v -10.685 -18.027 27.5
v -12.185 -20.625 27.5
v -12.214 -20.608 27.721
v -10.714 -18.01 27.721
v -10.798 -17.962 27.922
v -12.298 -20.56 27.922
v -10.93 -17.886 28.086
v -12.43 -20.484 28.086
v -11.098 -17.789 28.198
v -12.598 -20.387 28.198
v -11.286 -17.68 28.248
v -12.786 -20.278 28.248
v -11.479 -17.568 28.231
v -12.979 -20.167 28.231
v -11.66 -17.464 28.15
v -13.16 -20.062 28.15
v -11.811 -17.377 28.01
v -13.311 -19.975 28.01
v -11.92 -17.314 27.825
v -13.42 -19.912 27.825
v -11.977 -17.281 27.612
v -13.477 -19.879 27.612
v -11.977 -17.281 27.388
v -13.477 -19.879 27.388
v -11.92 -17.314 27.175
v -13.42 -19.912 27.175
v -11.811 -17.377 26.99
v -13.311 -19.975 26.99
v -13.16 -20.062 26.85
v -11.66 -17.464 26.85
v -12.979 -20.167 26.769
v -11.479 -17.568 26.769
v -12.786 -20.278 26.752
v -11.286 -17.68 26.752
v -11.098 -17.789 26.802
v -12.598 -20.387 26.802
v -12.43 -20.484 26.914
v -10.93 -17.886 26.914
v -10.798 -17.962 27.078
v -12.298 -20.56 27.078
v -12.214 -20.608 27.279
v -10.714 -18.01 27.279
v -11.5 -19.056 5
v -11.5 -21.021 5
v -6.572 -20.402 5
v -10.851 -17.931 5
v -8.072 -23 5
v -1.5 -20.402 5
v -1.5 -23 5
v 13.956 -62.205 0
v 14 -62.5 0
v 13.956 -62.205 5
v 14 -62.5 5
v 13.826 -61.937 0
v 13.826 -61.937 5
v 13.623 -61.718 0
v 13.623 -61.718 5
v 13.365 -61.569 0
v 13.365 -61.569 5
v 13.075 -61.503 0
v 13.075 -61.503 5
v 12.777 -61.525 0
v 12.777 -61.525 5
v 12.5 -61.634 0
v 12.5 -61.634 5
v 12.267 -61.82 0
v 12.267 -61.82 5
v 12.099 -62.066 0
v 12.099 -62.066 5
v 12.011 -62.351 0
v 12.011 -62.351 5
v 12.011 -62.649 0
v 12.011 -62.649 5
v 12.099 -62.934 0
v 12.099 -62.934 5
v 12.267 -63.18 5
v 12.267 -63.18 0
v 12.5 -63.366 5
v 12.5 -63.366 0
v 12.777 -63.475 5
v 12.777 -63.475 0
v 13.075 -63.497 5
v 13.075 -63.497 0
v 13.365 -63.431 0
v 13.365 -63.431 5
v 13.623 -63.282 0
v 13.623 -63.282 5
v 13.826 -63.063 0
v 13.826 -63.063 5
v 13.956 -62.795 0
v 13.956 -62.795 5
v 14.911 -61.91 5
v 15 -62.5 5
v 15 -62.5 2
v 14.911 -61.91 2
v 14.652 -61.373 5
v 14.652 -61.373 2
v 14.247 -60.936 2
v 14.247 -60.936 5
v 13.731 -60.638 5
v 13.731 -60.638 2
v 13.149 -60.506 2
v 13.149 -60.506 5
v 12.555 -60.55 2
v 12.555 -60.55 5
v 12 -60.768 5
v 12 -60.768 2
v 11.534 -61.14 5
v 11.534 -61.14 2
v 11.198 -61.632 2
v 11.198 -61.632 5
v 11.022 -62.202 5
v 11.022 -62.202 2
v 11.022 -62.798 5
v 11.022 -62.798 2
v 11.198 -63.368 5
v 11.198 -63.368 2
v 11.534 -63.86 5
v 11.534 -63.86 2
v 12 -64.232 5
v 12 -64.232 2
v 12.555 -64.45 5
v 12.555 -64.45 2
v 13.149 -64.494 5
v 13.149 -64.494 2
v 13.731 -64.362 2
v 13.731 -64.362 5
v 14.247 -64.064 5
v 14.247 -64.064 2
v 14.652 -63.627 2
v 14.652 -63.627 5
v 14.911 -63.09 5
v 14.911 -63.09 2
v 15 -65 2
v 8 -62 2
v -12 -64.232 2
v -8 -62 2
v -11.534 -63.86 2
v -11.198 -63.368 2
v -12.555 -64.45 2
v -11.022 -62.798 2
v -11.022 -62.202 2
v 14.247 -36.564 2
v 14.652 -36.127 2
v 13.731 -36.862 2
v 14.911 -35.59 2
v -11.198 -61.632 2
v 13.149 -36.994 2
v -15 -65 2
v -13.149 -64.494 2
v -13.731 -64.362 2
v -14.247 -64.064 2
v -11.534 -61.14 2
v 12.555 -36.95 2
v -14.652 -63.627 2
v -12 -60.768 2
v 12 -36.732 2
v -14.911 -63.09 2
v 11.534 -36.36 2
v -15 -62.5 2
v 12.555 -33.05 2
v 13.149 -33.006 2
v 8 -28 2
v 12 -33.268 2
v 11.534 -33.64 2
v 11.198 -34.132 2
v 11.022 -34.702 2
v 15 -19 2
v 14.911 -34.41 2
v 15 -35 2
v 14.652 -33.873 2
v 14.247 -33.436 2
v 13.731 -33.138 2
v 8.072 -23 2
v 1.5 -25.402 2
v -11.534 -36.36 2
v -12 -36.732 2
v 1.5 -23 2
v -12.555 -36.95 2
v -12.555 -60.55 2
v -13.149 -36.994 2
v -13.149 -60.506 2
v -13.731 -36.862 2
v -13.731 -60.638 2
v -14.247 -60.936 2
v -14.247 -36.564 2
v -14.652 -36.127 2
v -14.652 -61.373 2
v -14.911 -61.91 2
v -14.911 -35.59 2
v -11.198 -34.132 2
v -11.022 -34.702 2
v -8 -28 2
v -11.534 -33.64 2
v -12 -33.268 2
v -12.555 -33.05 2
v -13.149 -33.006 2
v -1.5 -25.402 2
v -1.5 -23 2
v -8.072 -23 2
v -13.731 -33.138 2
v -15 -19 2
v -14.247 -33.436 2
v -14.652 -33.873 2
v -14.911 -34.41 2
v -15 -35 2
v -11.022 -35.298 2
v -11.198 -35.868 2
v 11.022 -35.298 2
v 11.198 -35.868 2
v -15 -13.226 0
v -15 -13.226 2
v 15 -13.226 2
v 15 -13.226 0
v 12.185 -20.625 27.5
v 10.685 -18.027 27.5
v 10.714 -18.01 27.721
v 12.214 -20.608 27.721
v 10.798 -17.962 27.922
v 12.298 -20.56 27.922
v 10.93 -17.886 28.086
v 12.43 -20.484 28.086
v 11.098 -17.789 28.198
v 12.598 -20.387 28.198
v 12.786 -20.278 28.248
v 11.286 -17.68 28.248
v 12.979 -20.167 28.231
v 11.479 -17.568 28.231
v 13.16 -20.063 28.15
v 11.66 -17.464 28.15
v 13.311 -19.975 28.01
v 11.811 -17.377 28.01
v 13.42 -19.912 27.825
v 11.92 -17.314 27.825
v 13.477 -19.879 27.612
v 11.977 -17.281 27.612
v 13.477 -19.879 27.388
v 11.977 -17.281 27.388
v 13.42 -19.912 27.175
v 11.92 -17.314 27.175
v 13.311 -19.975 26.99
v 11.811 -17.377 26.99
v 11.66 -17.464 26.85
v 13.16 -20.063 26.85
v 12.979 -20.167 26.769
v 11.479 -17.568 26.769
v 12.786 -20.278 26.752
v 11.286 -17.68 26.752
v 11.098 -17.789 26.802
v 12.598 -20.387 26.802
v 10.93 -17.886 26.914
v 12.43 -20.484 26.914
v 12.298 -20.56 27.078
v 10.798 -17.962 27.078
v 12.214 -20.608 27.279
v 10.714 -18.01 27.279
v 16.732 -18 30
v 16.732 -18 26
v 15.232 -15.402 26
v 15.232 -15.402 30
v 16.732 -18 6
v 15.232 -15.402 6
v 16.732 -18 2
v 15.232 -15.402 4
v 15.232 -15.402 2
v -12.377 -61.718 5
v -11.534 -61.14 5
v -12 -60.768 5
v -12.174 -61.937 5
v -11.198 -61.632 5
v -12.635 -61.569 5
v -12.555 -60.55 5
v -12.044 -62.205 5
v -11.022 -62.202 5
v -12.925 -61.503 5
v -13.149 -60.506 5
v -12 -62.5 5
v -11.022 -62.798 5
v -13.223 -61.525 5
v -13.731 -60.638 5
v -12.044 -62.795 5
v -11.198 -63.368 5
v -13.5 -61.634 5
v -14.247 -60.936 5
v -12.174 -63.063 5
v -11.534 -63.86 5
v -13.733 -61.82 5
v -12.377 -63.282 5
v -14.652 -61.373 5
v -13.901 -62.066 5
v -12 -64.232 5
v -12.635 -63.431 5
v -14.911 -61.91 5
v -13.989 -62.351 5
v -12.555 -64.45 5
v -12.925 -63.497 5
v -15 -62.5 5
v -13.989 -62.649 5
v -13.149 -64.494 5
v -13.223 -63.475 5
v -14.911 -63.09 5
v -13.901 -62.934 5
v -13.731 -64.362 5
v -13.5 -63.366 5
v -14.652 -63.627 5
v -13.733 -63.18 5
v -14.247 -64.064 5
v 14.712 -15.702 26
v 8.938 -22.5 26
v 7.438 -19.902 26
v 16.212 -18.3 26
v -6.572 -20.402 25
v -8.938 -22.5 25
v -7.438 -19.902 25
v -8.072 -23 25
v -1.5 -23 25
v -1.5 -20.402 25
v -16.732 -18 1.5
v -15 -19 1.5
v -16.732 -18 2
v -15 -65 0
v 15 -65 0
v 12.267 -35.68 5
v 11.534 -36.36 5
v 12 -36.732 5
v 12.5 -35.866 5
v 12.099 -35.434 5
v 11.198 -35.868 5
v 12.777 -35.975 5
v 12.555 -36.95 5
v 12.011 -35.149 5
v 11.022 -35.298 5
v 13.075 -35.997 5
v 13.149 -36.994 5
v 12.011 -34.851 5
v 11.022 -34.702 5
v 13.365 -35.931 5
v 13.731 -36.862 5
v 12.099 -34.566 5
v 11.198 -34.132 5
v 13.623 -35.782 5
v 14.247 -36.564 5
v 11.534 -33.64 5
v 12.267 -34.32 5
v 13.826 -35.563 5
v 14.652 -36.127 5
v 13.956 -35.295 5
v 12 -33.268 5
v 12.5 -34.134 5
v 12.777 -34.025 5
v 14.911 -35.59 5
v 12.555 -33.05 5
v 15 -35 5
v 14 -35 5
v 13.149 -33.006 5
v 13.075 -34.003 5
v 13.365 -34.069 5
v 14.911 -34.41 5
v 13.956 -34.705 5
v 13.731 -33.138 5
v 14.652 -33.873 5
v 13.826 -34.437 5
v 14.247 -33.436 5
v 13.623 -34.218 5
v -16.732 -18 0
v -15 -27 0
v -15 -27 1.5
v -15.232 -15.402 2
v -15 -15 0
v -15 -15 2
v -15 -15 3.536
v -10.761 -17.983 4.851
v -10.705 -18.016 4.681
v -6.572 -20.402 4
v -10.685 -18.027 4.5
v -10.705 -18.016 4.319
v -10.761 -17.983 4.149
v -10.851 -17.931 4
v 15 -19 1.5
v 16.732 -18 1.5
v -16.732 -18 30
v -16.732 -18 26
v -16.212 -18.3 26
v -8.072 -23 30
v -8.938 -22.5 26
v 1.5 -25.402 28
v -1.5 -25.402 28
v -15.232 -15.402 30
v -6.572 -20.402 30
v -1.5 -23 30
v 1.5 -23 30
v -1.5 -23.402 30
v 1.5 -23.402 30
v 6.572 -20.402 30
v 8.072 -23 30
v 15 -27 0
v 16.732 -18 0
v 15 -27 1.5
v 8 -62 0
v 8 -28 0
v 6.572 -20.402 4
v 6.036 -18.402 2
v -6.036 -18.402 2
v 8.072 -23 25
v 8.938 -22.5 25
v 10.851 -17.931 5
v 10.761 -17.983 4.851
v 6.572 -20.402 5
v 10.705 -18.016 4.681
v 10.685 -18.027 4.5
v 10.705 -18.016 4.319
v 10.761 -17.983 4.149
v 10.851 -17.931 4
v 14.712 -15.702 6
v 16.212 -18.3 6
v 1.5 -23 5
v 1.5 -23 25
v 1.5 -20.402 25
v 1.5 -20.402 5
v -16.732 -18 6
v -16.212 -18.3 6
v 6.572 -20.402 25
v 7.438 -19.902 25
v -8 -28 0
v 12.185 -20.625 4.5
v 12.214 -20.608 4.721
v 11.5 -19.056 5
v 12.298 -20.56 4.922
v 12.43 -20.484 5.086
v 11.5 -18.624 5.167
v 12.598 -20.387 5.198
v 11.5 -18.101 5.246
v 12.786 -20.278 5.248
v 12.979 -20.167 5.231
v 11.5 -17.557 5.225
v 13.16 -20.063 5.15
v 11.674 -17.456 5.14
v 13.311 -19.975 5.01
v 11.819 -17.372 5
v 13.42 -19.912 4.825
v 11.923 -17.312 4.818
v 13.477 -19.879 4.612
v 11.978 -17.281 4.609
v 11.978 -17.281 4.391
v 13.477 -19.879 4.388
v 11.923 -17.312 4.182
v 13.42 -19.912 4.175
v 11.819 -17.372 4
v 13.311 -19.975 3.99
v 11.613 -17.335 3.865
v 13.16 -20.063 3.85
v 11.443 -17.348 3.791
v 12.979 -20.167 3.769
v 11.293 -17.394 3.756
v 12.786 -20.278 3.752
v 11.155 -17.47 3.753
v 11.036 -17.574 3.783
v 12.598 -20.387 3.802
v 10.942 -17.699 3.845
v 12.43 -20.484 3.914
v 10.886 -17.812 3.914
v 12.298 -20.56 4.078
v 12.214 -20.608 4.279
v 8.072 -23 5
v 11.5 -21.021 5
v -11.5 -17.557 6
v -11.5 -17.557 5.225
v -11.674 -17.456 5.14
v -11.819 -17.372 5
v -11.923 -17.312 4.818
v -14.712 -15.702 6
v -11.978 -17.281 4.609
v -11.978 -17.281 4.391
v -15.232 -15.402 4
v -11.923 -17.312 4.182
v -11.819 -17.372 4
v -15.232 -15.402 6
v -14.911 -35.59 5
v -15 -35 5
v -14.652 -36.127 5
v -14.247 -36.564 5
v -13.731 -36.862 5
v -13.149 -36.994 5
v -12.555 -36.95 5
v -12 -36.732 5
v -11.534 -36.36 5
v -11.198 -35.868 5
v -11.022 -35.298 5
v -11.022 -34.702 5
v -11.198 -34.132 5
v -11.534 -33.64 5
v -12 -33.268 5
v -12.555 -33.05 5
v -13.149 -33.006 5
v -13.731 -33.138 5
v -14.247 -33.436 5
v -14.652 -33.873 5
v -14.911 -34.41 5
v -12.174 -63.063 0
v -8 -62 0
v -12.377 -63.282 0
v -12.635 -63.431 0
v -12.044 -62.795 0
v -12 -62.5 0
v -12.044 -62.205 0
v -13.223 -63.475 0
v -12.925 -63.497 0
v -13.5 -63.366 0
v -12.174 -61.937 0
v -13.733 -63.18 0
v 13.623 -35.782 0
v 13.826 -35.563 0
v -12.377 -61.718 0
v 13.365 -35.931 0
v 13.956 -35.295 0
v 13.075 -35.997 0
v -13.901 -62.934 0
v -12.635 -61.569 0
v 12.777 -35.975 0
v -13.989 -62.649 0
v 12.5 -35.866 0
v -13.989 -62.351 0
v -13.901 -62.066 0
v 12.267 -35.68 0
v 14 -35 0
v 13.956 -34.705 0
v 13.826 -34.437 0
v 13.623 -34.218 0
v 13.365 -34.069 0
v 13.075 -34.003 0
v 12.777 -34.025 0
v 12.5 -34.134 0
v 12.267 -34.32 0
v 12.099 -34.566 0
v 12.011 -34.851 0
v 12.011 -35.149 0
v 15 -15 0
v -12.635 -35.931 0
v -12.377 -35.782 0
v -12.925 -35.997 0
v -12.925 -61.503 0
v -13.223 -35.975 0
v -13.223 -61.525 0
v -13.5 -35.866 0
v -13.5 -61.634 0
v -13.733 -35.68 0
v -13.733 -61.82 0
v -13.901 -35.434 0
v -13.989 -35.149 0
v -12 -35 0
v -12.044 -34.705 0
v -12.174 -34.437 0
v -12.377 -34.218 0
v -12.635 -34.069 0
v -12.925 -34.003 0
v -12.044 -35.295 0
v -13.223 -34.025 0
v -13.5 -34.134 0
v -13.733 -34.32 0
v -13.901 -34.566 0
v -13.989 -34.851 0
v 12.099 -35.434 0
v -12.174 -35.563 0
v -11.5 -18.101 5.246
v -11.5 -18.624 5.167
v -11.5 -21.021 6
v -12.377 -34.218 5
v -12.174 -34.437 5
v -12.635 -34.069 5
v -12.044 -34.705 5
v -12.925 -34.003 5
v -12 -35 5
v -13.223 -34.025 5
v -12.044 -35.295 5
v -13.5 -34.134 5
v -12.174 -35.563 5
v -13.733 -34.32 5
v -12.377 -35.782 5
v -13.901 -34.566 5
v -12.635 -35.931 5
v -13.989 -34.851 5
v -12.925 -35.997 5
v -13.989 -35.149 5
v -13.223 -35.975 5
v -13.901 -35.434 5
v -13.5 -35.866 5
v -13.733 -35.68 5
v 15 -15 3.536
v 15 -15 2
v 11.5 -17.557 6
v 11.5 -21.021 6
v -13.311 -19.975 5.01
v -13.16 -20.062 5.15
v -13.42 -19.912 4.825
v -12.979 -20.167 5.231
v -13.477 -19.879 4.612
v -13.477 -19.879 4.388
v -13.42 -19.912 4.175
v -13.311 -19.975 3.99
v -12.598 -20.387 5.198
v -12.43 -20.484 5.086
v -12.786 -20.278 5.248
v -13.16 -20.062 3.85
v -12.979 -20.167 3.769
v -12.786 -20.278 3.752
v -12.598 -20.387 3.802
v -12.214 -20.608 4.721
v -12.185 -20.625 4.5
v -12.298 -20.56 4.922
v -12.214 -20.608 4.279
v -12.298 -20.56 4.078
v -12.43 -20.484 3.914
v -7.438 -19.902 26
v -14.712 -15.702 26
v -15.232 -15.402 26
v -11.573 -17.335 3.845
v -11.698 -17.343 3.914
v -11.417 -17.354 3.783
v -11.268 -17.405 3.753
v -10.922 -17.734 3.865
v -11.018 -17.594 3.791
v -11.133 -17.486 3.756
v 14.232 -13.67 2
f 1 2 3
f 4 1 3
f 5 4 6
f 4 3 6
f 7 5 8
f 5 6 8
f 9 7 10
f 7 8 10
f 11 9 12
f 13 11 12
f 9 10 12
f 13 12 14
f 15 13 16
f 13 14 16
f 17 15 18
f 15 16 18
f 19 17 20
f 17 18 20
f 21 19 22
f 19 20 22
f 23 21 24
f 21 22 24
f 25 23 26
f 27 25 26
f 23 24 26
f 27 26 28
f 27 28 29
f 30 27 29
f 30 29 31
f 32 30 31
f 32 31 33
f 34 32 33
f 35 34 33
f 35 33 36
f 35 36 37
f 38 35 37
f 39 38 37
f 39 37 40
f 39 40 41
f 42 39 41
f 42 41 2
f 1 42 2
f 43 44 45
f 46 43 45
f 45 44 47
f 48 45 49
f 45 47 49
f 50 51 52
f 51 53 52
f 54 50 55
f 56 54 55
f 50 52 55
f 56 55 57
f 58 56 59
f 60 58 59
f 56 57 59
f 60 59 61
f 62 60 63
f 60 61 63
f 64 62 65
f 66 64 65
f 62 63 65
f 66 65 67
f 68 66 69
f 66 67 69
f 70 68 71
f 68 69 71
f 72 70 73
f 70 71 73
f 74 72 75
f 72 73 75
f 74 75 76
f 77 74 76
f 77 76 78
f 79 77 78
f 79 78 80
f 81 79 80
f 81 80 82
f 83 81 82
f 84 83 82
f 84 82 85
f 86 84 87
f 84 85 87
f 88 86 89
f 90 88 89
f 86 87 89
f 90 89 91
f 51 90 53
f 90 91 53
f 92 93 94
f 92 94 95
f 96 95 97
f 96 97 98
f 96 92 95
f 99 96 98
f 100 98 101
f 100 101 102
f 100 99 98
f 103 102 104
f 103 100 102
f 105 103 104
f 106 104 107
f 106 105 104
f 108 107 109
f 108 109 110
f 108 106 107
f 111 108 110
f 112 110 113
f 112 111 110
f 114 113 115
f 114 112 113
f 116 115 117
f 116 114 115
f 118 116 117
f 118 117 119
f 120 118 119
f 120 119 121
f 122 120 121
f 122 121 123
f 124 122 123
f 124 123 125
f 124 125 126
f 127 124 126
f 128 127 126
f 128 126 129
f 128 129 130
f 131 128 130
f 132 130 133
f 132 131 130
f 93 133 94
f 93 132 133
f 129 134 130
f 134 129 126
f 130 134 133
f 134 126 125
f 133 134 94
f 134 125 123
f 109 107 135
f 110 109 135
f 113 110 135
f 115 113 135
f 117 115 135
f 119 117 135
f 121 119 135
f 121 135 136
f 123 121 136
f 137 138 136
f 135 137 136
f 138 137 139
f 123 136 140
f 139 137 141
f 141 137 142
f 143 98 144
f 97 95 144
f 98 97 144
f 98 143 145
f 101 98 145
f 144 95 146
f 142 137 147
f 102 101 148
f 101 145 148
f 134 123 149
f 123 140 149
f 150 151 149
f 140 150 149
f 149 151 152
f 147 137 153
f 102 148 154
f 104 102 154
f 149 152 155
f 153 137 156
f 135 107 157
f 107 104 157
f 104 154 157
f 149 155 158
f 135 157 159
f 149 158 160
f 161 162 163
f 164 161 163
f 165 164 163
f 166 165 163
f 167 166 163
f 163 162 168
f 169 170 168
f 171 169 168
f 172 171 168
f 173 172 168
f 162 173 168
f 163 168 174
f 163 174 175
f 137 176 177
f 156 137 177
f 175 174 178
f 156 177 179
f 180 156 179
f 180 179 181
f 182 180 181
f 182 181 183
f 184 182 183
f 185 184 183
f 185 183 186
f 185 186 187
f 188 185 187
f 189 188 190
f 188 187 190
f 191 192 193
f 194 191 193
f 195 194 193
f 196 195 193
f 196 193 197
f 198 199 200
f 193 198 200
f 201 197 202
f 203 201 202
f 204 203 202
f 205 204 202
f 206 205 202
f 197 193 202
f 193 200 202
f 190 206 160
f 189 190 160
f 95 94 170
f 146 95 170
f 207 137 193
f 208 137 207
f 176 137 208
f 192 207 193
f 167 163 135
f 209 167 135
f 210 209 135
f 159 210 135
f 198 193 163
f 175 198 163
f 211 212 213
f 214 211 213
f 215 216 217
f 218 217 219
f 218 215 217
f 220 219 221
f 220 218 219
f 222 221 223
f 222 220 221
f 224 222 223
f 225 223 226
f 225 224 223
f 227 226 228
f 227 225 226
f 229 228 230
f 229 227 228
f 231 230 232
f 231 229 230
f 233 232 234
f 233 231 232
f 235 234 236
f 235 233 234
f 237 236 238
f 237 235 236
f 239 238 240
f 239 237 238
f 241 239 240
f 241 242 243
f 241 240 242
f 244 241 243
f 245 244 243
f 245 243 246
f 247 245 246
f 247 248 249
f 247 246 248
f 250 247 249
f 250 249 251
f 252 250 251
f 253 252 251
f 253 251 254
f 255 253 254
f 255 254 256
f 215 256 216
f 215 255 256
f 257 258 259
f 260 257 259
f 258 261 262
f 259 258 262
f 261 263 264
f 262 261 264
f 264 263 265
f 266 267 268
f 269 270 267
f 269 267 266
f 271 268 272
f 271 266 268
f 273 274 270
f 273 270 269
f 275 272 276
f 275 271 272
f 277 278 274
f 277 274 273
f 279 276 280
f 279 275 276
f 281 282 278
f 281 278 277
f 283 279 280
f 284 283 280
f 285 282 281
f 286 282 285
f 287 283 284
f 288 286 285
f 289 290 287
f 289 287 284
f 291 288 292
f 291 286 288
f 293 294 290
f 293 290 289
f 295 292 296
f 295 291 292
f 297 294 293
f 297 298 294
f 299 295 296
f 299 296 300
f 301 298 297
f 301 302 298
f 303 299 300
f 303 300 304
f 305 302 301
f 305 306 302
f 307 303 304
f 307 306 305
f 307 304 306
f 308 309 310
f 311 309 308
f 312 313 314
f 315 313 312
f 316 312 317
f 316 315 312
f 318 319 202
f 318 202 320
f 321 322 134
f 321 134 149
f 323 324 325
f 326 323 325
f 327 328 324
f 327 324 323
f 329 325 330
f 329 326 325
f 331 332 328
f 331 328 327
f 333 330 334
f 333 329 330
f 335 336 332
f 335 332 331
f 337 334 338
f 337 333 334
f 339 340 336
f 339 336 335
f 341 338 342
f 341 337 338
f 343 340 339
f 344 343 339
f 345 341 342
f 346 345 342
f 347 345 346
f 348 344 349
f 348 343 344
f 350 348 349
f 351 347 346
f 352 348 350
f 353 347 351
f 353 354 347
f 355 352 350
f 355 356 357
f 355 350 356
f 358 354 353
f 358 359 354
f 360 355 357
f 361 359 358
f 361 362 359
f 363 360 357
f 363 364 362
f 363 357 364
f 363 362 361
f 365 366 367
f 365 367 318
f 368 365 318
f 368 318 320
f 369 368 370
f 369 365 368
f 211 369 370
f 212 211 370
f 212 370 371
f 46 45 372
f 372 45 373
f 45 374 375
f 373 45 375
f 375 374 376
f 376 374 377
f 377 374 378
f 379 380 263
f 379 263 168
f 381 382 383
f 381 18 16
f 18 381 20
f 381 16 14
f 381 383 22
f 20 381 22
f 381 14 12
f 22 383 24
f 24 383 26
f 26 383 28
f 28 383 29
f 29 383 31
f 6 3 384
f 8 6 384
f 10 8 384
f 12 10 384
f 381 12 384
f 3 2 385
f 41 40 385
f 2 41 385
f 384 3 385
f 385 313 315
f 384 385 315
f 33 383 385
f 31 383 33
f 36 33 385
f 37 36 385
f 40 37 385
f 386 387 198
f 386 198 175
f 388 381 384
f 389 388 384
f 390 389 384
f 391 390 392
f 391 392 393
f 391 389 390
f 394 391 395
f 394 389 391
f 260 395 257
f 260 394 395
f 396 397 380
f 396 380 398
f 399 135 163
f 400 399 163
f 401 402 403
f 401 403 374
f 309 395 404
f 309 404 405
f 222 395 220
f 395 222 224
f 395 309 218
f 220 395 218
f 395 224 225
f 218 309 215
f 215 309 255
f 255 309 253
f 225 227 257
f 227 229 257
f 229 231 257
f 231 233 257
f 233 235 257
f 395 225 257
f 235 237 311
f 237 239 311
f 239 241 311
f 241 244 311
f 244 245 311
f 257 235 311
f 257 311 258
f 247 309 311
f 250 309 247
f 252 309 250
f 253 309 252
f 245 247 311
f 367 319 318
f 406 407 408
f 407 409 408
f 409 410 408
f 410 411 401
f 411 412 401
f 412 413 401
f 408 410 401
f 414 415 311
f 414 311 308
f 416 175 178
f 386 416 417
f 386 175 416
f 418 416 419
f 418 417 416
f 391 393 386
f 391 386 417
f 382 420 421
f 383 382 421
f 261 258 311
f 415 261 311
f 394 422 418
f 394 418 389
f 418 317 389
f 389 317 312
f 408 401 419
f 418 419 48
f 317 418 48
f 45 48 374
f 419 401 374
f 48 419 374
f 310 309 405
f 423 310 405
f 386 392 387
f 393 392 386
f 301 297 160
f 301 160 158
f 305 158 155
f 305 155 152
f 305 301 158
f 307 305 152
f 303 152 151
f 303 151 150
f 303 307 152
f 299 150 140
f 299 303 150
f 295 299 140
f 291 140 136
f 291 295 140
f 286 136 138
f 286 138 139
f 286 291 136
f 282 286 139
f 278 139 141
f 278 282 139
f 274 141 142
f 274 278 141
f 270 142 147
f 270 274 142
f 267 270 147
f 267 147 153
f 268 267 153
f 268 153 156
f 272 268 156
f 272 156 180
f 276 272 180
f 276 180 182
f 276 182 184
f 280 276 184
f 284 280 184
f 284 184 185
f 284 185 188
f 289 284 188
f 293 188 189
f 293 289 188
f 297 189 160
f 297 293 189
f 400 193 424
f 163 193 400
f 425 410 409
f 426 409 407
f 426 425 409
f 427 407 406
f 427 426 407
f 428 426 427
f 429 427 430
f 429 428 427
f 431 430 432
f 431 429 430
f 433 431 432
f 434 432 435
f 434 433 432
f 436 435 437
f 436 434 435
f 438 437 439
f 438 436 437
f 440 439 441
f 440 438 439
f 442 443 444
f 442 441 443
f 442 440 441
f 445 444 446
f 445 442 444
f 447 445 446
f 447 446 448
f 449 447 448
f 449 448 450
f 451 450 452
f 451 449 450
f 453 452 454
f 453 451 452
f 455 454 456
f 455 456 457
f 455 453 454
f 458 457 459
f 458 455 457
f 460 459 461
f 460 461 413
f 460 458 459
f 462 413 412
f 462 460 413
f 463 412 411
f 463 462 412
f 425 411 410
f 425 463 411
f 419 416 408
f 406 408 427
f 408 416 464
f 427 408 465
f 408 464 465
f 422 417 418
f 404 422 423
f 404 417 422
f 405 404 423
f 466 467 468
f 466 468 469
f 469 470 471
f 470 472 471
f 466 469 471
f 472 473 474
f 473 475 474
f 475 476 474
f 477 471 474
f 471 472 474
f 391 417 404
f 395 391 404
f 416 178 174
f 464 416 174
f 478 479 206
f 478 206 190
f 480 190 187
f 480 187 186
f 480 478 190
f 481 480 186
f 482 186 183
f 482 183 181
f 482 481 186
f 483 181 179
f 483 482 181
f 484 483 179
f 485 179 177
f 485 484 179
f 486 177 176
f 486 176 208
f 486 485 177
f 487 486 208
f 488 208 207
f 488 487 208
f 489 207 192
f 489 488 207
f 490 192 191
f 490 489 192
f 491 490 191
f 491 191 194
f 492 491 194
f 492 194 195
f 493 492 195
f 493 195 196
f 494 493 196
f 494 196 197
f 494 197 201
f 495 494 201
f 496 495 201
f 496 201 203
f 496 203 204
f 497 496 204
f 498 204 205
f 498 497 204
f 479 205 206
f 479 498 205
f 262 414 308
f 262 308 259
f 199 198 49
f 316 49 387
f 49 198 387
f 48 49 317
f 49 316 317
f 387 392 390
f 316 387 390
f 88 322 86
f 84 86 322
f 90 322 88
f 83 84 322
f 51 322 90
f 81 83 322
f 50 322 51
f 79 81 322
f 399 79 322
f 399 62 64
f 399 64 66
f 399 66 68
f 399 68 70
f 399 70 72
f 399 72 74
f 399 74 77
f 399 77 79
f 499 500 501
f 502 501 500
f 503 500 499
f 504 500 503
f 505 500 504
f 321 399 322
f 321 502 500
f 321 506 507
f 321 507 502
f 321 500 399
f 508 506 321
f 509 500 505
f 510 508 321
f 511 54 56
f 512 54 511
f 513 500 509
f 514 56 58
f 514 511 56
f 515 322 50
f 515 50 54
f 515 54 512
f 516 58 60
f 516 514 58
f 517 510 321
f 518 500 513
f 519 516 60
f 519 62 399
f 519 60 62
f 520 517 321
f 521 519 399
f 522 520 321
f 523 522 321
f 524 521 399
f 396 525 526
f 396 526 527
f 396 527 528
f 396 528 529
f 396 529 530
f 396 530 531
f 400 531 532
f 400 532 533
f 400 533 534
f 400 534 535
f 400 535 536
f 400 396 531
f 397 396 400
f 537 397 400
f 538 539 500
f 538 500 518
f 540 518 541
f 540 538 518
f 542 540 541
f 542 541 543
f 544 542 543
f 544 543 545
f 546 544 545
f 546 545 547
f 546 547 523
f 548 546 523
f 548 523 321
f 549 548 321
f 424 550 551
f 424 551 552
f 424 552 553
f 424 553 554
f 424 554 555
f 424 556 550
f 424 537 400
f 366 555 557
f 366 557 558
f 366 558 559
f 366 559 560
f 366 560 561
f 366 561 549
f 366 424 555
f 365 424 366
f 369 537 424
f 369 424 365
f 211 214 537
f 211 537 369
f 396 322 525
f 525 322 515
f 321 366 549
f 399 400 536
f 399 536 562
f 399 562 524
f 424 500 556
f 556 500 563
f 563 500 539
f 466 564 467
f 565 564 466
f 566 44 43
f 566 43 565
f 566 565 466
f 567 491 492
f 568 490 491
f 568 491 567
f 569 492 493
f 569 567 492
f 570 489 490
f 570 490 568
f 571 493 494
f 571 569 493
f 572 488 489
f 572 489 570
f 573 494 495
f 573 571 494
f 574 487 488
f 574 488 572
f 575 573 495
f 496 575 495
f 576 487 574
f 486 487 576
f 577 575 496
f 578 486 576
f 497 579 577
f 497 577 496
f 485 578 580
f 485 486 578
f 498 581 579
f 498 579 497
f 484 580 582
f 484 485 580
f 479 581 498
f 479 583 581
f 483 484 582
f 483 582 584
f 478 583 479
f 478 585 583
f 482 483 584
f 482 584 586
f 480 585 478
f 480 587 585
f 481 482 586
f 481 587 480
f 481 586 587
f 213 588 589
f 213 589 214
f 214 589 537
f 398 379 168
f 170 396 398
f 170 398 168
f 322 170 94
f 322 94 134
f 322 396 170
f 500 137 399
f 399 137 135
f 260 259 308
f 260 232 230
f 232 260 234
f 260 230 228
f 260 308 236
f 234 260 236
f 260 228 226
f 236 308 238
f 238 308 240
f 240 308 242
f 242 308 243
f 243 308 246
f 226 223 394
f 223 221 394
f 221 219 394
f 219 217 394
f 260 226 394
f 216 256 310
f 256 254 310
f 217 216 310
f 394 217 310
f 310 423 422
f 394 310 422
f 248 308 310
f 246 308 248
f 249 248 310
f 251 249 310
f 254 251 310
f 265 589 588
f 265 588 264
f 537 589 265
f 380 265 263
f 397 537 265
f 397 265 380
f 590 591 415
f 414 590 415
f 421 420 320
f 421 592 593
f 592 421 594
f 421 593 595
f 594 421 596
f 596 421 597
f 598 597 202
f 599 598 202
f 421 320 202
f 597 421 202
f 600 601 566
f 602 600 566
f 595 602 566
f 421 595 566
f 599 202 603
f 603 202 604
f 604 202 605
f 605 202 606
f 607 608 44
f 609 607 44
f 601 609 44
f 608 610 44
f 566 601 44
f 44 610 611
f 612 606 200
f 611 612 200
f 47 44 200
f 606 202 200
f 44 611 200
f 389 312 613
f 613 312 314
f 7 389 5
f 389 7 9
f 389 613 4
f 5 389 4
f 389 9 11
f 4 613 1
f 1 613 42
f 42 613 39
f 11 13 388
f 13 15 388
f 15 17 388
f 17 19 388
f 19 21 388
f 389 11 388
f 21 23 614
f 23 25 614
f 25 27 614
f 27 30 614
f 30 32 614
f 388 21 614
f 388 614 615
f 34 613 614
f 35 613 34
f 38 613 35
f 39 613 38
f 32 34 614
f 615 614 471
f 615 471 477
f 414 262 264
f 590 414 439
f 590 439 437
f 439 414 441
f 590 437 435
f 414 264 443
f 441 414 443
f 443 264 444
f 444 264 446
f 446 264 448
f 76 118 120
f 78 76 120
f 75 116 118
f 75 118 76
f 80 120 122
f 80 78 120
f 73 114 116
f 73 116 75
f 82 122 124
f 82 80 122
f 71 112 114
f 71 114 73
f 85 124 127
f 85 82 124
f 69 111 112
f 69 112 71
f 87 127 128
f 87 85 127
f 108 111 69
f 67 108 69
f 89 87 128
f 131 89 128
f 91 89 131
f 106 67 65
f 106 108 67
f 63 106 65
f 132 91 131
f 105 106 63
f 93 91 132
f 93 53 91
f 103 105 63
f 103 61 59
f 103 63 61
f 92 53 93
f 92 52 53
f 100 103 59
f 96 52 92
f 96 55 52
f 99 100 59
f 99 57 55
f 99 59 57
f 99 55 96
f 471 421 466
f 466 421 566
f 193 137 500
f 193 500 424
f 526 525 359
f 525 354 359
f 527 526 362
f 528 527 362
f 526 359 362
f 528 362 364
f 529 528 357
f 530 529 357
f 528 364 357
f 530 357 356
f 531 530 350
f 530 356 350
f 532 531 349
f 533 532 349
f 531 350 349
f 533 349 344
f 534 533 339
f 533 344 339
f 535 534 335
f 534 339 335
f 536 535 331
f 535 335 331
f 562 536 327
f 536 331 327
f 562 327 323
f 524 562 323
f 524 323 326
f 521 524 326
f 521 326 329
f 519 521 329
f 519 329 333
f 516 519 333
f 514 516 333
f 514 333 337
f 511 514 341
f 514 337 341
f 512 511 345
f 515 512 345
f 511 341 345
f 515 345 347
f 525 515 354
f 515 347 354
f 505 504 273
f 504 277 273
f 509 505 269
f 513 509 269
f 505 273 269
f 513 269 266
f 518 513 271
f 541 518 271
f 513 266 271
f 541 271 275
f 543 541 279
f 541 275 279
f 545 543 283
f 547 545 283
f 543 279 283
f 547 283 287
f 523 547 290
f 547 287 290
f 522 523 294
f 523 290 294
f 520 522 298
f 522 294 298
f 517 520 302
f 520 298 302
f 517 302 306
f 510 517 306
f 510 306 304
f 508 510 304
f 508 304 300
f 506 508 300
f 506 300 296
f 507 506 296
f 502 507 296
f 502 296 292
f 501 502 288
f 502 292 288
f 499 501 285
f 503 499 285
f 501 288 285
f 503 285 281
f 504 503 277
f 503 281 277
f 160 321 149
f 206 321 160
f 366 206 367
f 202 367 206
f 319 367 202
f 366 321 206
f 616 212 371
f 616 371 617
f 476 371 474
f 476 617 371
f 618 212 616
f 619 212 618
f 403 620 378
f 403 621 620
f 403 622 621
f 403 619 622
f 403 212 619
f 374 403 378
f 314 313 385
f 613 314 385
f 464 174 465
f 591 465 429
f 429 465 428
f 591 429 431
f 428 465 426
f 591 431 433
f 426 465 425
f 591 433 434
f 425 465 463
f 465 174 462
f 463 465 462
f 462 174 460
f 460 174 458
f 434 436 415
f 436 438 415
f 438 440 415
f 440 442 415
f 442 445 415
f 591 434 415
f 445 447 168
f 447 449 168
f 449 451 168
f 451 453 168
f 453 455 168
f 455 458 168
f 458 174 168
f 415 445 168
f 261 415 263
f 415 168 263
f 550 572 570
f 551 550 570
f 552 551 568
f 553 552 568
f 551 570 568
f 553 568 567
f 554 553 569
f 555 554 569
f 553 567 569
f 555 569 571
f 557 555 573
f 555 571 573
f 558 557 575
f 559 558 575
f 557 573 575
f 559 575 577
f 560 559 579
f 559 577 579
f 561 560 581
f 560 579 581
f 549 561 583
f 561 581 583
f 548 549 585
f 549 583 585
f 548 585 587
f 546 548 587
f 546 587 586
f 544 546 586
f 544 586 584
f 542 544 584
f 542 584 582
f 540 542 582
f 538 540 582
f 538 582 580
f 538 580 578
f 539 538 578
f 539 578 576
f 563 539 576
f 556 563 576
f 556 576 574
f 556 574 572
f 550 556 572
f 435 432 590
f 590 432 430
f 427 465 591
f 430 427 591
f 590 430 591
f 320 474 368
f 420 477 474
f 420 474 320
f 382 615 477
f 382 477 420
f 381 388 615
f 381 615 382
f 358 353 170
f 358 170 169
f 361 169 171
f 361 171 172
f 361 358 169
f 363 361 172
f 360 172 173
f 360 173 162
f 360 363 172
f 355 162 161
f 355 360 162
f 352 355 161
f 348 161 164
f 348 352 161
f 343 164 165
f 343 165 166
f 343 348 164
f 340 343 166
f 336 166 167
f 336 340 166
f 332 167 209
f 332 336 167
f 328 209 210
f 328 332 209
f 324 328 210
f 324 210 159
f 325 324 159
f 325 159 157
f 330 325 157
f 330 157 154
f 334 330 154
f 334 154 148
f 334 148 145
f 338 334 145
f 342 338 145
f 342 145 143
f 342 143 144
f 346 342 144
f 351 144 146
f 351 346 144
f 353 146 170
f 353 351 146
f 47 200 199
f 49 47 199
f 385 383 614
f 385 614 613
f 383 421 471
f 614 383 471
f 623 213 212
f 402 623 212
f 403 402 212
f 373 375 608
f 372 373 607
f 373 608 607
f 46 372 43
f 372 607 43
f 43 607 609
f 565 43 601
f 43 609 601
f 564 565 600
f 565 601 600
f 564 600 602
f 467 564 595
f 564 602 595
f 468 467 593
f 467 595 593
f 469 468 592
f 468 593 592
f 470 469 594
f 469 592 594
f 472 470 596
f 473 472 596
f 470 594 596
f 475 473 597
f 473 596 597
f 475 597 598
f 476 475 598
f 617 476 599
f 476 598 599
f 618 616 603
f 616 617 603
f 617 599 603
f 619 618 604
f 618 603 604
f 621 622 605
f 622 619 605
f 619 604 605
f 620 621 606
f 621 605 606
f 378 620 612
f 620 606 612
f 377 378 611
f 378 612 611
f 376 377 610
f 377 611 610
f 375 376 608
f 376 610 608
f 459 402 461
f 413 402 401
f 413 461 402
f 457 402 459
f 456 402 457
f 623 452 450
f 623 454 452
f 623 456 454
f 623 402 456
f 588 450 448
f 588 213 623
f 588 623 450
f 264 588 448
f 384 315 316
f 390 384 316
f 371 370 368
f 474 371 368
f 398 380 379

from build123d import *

# Parameters (mm, degrees)
EXTRUDE_1_DEPTH      = 2
EXTRUDE_2_DEPTH      = 28
EXTRUDE_2_DEPTH_BACK = 2
CUT_EXTRUDE_5_REACH  = 61.651
SKETCH_3_R           = 0.75
SKETCH_3_W           = 9
SKETCH_3_H           = 20
CUT_EXTRUDE_7_REACH  = 62.685
SKETCH_12_R          = 0.75
SKETCH_12_W          = 9
SKETCH_12_H          = 20
CUT_EXTRUDE_8_REACH  = 74.725
SKETCH_13_R          = 1
SKETCH_13_W          = 16
SKETCH_13_H          = 34
CHAMFER_5_SIZE       = 2
SKETCH_14_W          = 3
SKETCH_14_H          = 5
EXTRUDE_8_DEPTH      = 28
CHAMFER_6_SIZE       = 2
EXTRUDE_START        = 3
SKETCH_15_R          = 2
SKETCH_15_R_2        = 1
EXTRUDE_9_DEPTH      = 3
CUT_EXTRUDE_9_REACH  = 56.258
SKETCH_16_W          = 10
SKETCH_16_H          = 20
EXTRUDE_10_DEPTH     = 24
EXTRUDE_11_DEPTH     = 1.5
CUT_EXTRUDE_10_REACH = 74.725
SKETCH_19_W          = 30
SKETCH_19_H          = 13.226497308


with BuildPart() as part:
    # 草圖1 → 填料-伸長1 (new body)
    with BuildSketch(Plane.XY):
        Polygon((-15, 0), (15, 0), (15, -15), (16.732050808, -18), (15, -19), (15, -65), (-15, -65), (-15, -19), (-16.732050808, -18), (-15, -15), align=None)
    extrude(amount=EXTRUDE_1_DEPTH)

    # 草圖2 → 填料-伸長2 (add, two sides: drawn at the far end of the back side and taken through both)
    with BuildSketch(Plane.XY.offset(2).offset(-EXTRUDE_2_DEPTH_BACK)):
        Polygon((-16.732050808, -18), (-8.07179677, -23), (8.07179677, -23), (16.732050808, -18), (15.232050808, -15.401923789), (6.57179677, -20.401923789), (-6.57179677, -20.401923789), (-15.232050808, -15.401923789), align=None)
    extrude(amount=EXTRUDE_2_DEPTH + EXTRUDE_2_DEPTH_BACK)

    # 草圖3 → 除料-伸長5 (cut, up to next)
    with BuildSketch(Plane(origin=(10.813121216, -21.417295593, 0), x_dir=(0.8660254037844397, 0.49999999999999806, 0), z_dir=(-0.49999999999999806, 0.8660254037844397, 0)), mode=Mode.PRIVATE) as cut_extrude_5_sk1:
        with Locations(Location((2.334591186, -4.5, 0), (0, 0, 180))):
            Circle(SKETCH_3_R)
    cut_extrude_5_tool1 = extrude(cut_extrude_5_sk1.sketch, amount=CUT_EXTRUDE_5_REACH, mode=Mode.PRIVATE) & part.part
    # 草圖3 → 除料-伸長5 (cut, up to next)
    with BuildSketch(Plane(origin=(10.813121216, -21.417295593, 0), x_dir=(0.8660254037844397, 0.49999999999999806, 0), z_dir=(-0.49999999999999806, 0.8660254037844397, 0)), mode=Mode.PRIVATE) as cut_extrude_5_sk2:
        with Locations(Location((2.334591186, -27.5, 0), (0, 0, 180))):
            Circle(SKETCH_3_R)
    cut_extrude_5_tool2 = extrude(cut_extrude_5_sk2.sketch, amount=CUT_EXTRUDE_5_REACH, mode=Mode.PRIVATE) & part.part
    # 草圖3 → 除料-伸長5 (cut, up to next)
    with BuildSketch(Plane(origin=(10.813121216, -21.417295593, 0), x_dir=(0.8660254037844397, 0.49999999999999806, 0), z_dir=(-0.49999999999999806, 0.8660254037844397, 0)), mode=Mode.PRIVATE) as cut_extrude_5_sk3:
        with Locations((2.334591186, -16)):
            Rectangle(SKETCH_3_W, SKETCH_3_H)
    cut_extrude_5_tool3 = extrude(cut_extrude_5_sk3.sketch, amount=CUT_EXTRUDE_5_REACH, mode=Mode.PRIVATE) & part.part
    add(cut_extrude_5_tool1.solids().sort_by_distance((12.834936, -20.25, 4.5))[0], mode=Mode.SUBTRACT)
    add(cut_extrude_5_tool2.solids().sort_by_distance((12.834936, -20.25, 27.5))[0], mode=Mode.SUBTRACT)
    add(cut_extrude_5_tool3.solids().sort_by_distance((12.834936, -20.25, 16))[0], mode=Mode.SUBTRACT)

    # 草圖12 → 除料-伸長7 (cut, up to next)
    with BuildSketch(Plane(origin=(-11.977241336, -20.745190528, 0), x_dir=(0.8660254037844368, -0.5000000000000032, 0), z_dir=(-0.5000000000000032, -0.8660254037844369, 0)), mode=Mode.PRIVATE) as cut_extrude_7_sk1:
        with Locations((-0.990381057, 27.5)):
            Circle(SKETCH_12_R)
    cut_extrude_7_tool1 = extrude(cut_extrude_7_sk1.sketch, amount=-CUT_EXTRUDE_7_REACH, mode=Mode.PRIVATE) & part.part
    # 草圖12 → 除料-伸長7 (cut, up to next)
    with BuildSketch(Plane(origin=(-11.977241336, -20.745190528, 0), x_dir=(0.8660254037844368, -0.5000000000000032, 0), z_dir=(-0.5000000000000032, -0.8660254037844369, 0)), mode=Mode.PRIVATE) as cut_extrude_7_sk2:
        with Locations((-0.990381057, 4.5)):
            Circle(SKETCH_12_R)
    cut_extrude_7_tool2 = extrude(cut_extrude_7_sk2.sketch, amount=-CUT_EXTRUDE_7_REACH, mode=Mode.PRIVATE) & part.part
    # 草圖12 → 除料-伸長7 (cut, up to next)
    with BuildSketch(Plane(origin=(-11.977241336, -20.745190528, 0), x_dir=(0.8660254037844368, -0.5000000000000032, 0), z_dir=(-0.5000000000000032, -0.8660254037844369, 0)), mode=Mode.PRIVATE) as cut_extrude_7_sk3:
        with Locations((-0.990381057, 16)):
            Rectangle(SKETCH_12_W, SKETCH_12_H)
    cut_extrude_7_tool3 = extrude(cut_extrude_7_sk3.sketch, amount=-CUT_EXTRUDE_7_REACH, mode=Mode.PRIVATE) & part.part
    add(cut_extrude_7_tool1.solids().sort_by_distance((-12.834936, -20.25, 27.5))[0], mode=Mode.SUBTRACT)
    add(cut_extrude_7_tool2.solids().sort_by_distance((-12.834936, -20.25, 4.5))[0], mode=Mode.SUBTRACT)
    add(cut_extrude_7_tool3.solids().sort_by_distance((-12.834936, -20.25, 16))[0], mode=Mode.SUBTRACT)

    # 草圖13 → 除料-伸長8 (cut, up to next)
    with BuildSketch(Plane.XY.offset(2), mode=Mode.PRIVATE) as cut_extrude_8_sk1:
        with Locations((-13, -35)):
            Circle(SKETCH_13_R)
    cut_extrude_8_tool1 = extrude(cut_extrude_8_sk1.sketch, amount=-CUT_EXTRUDE_8_REACH, mode=Mode.PRIVATE) & part.part
    # 草圖13 → 除料-伸長8 (cut, up to next)
    with BuildSketch(Plane.XY.offset(2), mode=Mode.PRIVATE) as cut_extrude_8_sk2:
        with Locations((13, -35)):
            Circle(SKETCH_13_R)
    cut_extrude_8_tool2 = extrude(cut_extrude_8_sk2.sketch, amount=-CUT_EXTRUDE_8_REACH, mode=Mode.PRIVATE) & part.part
    # 草圖13 → 除料-伸長8 (cut, up to next)
    with BuildSketch(Plane.XY.offset(2), mode=Mode.PRIVATE) as cut_extrude_8_sk3:
        with Locations((-13, -62.5)):
            Circle(SKETCH_13_R)
    cut_extrude_8_tool3 = extrude(cut_extrude_8_sk3.sketch, amount=-CUT_EXTRUDE_8_REACH, mode=Mode.PRIVATE) & part.part
    # 草圖13 → 除料-伸長8 (cut, up to next)
    with BuildSketch(Plane.XY.offset(2), mode=Mode.PRIVATE) as cut_extrude_8_sk4:
        with Locations((13, -62.5)):
            Circle(SKETCH_13_R)
    cut_extrude_8_tool4 = extrude(cut_extrude_8_sk4.sketch, amount=-CUT_EXTRUDE_8_REACH, mode=Mode.PRIVATE) & part.part
    # 草圖13 → 除料-伸長8 (cut, up to next)
    with BuildSketch(Plane.XY.offset(2), mode=Mode.PRIVATE) as cut_extrude_8_sk5:
        with Locations((0, -45)):
            Rectangle(SKETCH_13_W, SKETCH_13_H)
    cut_extrude_8_tool5 = extrude(cut_extrude_8_sk5.sketch, amount=-CUT_EXTRUDE_8_REACH, mode=Mode.PRIVATE) & part.part
    add(cut_extrude_8_tool1.solids().sort_by_distance((-13, -35, 2))[0], mode=Mode.SUBTRACT)
    add(cut_extrude_8_tool2.solids().sort_by_distance((13, -35, 2))[0], mode=Mode.SUBTRACT)
    add(cut_extrude_8_tool3.solids().sort_by_distance((-13, -62.5, 2))[0], mode=Mode.SUBTRACT)
    add(cut_extrude_8_tool4.solids().sort_by_distance((13, -62.5, 2))[0], mode=Mode.SUBTRACT)
    add(cut_extrude_8_tool5.solids().sort_by_distance((0, -45, 2))[0], mode=Mode.SUBTRACT)

    # 導角5
    # the kernel refuses this chamfer: 2 mm, written as the material it adds along each edge
    with BuildSketch(Plane(origin=(15.232050808, -15.401923789, 2), x_dir=(-0.4998109584556485, 0.8656979742248804, -0.027495876610586403), z_dir=(-0.8660254037844387, -0.5000000000000001, 0))) as chamfer_5_piece_1_section:
        Polygon((CHAMFER_5_SIZE * 0.999621916911, -CHAMFER_5_SIZE * 0.0274958766106), (-CHAMFER_5_SIZE * 0.0274958766106, -CHAMFER_5_SIZE * 0.999621916911), (0, 0), align=None)
    chamfer_5_piece_1 = extrude(amount=15.143365976, mode=Mode.PRIVATE)
    chamfer_5_piece_1 = split(chamfer_5_piece_1, bisect_by=Plane(origin=(15, -15.354369678, 2.967720973), z_dir=(1, 0, 0)), keep=Keep.TOP, mode=Mode.PRIVATE)
    add(chamfer_5_piece_1)
    with BuildSketch(Plane(origin=(19.686336404, -12.830240801, 2), x_dir=(-0.4998109584556485, 0.8656979742248805, -0.027495876610586424), z_dir=(-0.8660254037844387, -0.5000000000000001, 0))) as chamfer_5_piece_2_section:
        Polygon((CHAMFER_5_SIZE * 0.999621916911, -CHAMFER_5_SIZE * 0.0274958766106), (-CHAMFER_5_SIZE * 0.0274958766106, -CHAMFER_5_SIZE * 0.999621916911), (0, 0), align=None)
    chamfer_5_piece_2 = extrude(amount=20.286731952, mode=Mode.PRIVATE)
    chamfer_5_piece_2 = split(chamfer_5_piece_2, bisect_by=Plane(origin=(15, -14.178978025, 2.335634482), z_dir=(-1, 0, 0)), keep=Keep.TOP, mode=Mode.PRIVATE)
    chamfer_5_piece_2 = split(chamfer_5_piece_2, bisect_by=Plane(origin=(14.593699493, -14.296266878, 2.335634482), z_dir=(0.8660254037844362, 0.5000000000000043, 0)), keep=Keep.TOP, mode=Mode.PRIVATE)
    add(chamfer_5_piece_2)
    with BuildSketch(Plane(origin=(15.232050808, -15.401923789, 2), x_dir=(-0.4998109584556485, 0.8656979742248804, -0.027495876610586403), z_dir=(-0.8660254037844387, -0.5000000000000001, 0))) as chamfer_5_piece_3_section:
        Polygon((CHAMFER_5_SIZE * 0.999621916911, -CHAMFER_5_SIZE * 0.0274958766106), (-CHAMFER_5_SIZE * 0.0274958766106, -CHAMFER_5_SIZE * 0.999621916911), (0, 0), align=None)
    chamfer_5_piece_3 = extrude(amount=15.143365976, mode=Mode.PRIVATE)
    chamfer_5_piece_3 = split(chamfer_5_piece_3, bisect_by=Plane(origin=(15, -17.612583445, 2.634430094), z_dir=(-1, 0, 0)), keep=Keep.TOP, mode=Mode.PRIVATE)
    chamfer_5_piece_3 = split(chamfer_5_piece_3, bisect_by=Plane(origin=(9.995642462, -20.401923789, 2.634430094), z_dir=(0, 1, 0)), keep=Keep.TOP, mode=Mode.PRIVATE)
    chamfer_5_piece_3 = chamfer_5_piece_3 - Plane(origin=(10.983078115, -17.042487205, 4.5), x_dir=(-0.8660254037844397, -0.49999999999999806, 0), z_dir=(0.49999999999999806, -0.8660254037844397, 0)) * Cylinder(0.75, 39, mode=Mode.PRIVATE)
    add(chamfer_5_piece_3)
    with BuildSketch(Plane(origin=(15.232050808, -15.401923789, 2), x_dir=(-0.4998109584556485, 0.8656979742248804, -0.027495876610586403), z_dir=(-0.8660254037844387, -0.5000000000000001, 0))) as chamfer_5_piece_4_section:
        Polygon((CHAMFER_5_SIZE * 0.999621916911, -CHAMFER_5_SIZE * 0.0274958766106), (-CHAMFER_5_SIZE * 0.0274958766106, -CHAMFER_5_SIZE * 0.999621916911), (0, 0), align=None)
    chamfer_5_piece_4 = extrude(amount=15.143365976, mode=Mode.PRIVATE)
    chamfer_5_piece_4 = split(chamfer_5_piece_4, bisect_by=Plane(origin=(3.657625077, -20.401923789, 2.718374554), z_dir=(0, -1, 0)), keep=Keep.TOP, mode=Mode.PRIVATE)
    add(chamfer_5_piece_4)
    with BuildSketch(Plane(origin=(11.715162746, -20.401923789, 2), x_dir=(0, 0.9996219169112968, -0.027495876610586403), z_dir=(-1, 0, 0))) as chamfer_5_piece_5:
        Polygon((CHAMFER_5_SIZE * 0.999621916911, -CHAMFER_5_SIZE * 0.0274958766106), (-CHAMFER_5_SIZE * 0.0274958766106, -CHAMFER_5_SIZE * 0.999621916911), (0, 0), align=None)
    extrude(amount=23.430325491)
    with BuildSketch(Plane(origin=(-2.117511174, -22.973606777, 2), x_dir=(0.4998109584556478, 0.8656979742248807, -0.027495876610586365), z_dir=(-0.866025403784439, 0.4999999999999994, 0))) as chamfer_5_piece_6_section:
        Polygon((CHAMFER_5_SIZE * 0.999621916911, -CHAMFER_5_SIZE * 0.0274958766106), (-CHAMFER_5_SIZE * 0.0274958766106, -CHAMFER_5_SIZE * 0.999621916911), (0, 0), align=None)
    chamfer_5_piece_6 = extrude(amount=15.143365976, mode=Mode.PRIVATE)
    chamfer_5_piece_6 = split(chamfer_5_piece_6, bisect_by=Plane(origin=(-3.657625077, -20.401923789, 2.718374554), z_dir=(0, -1, 0)), keep=Keep.TOP, mode=Mode.PRIVATE)
    add(chamfer_5_piece_6)
    with BuildSketch(Plane(origin=(-2.117511174, -22.973606777, 2), x_dir=(0.4998109584556478, 0.8656979742248807, -0.027495876610586365), z_dir=(-0.866025403784439, 0.4999999999999994, 0))) as chamfer_5_piece_7_section:
        Polygon((CHAMFER_5_SIZE * 0.999621916911, -CHAMFER_5_SIZE * 0.0274958766106), (-CHAMFER_5_SIZE * 0.0274958766106, -CHAMFER_5_SIZE * 0.999621916911), (0, 0), align=None)
    chamfer_5_piece_7 = extrude(amount=15.143365976, mode=Mode.PRIVATE)
    chamfer_5_piece_7 = split(chamfer_5_piece_7, bisect_by=Plane(origin=(-15, -17.612583445, 2.634430094), z_dir=(1, 0, 0)), keep=Keep.TOP, mode=Mode.PRIVATE)
    chamfer_5_piece_7 = split(chamfer_5_piece_7, bisect_by=Plane(origin=(-9.995642462, -20.401923789, 2.634430094), z_dir=(0, 1, 0)), keep=Keep.TOP, mode=Mode.PRIVATE)
    chamfer_5_piece_7 = chamfer_5_piece_7 - Plane(origin=(-10.983078115, -17.042487205, 4.5), x_dir=(0.8660254037844369, -0.5000000000000032, 0), z_dir=(-0.5000000000000032, -0.8660254037844369, 0)) * Cylinder(0.75, 39, mode=Mode.PRIVATE)
    add(chamfer_5_piece_7)
    with BuildSketch(Plane(origin=(-2.117511174, -22.973606777, 2), x_dir=(0.4998109584556478, 0.8656979742248807, -0.027495876610586365), z_dir=(-0.866025403784439, 0.4999999999999994, 0))) as chamfer_5_piece_8_section:
        Polygon((CHAMFER_5_SIZE * 0.999621916911, -CHAMFER_5_SIZE * 0.0274958766106), (-CHAMFER_5_SIZE * 0.0274958766106, -CHAMFER_5_SIZE * 0.999621916911), (0, 0), align=None)
    chamfer_5_piece_8 = extrude(amount=15.143365976, mode=Mode.PRIVATE)
    chamfer_5_piece_8 = split(chamfer_5_piece_8, bisect_by=Plane(origin=(-15, -15.354369678, 2.967720973), z_dir=(-1, 0, 0)), keep=Keep.TOP, mode=Mode.PRIVATE)
    add(chamfer_5_piece_8)
    with BuildSketch(Plane(origin=(-2.117511174, -22.973606777, 2), x_dir=(0.4998109584556478, 0.8656979742248807, -0.027495876610586365), z_dir=(-0.866025403784439, 0.4999999999999994, 0))) as chamfer_5_piece_9_section:
        Polygon((CHAMFER_5_SIZE * 0.999621916911, -CHAMFER_5_SIZE * 0.0274958766106), (-CHAMFER_5_SIZE * 0.0274958766106, -CHAMFER_5_SIZE * 0.999621916911), (0, 0), align=None)
    chamfer_5_piece_9 = extrude(amount=20.286731952, mode=Mode.PRIVATE)
    chamfer_5_piece_9 = split(chamfer_5_piece_9, bisect_by=Plane(origin=(-15, -14.178978025, 2.335634482), z_dir=(1, 0, 0)), keep=Keep.TOP, mode=Mode.PRIVATE)
    chamfer_5_piece_9 = split(chamfer_5_piece_9, bisect_by=Plane(origin=(-14.593699493, -14.296266878, 2.335634482), z_dir=(-0.8660254037844384, 0.5000000000000004, 0)), keep=Keep.TOP, mode=Mode.PRIVATE)
    add(chamfer_5_piece_9)

    # 草圖14 → 填料-伸長8 (add)
    with BuildSketch(Plane.XY.offset(30)):
        with Locations((0, -22.901923789)):
            Rectangle(SKETCH_14_W, SKETCH_14_H)
    extrude(amount=-EXTRUDE_8_DEPTH)

    # 導角6
    chamfer_6_edges = [part.edges().sort_by_distance(p)[0] for p in [
        (0, -25.401923789, 30),
    ]]
    chamfer(chamfer_6_edges, length=CHAMFER_6_SIZE)

    # 草圖15 → 填料-伸長9 (add)
    # profile 1 of 4: a face of its own
    with BuildSketch(Plane.XY.offset(2).offset(EXTRUDE_START)):
        with Locations(Location((-13, -35, 0), (0, 0, 180))):
            Circle(SKETCH_15_R)
        with Locations((-13, -35)):
            Circle(SKETCH_15_R_2, mode=Mode.SUBTRACT)
    # profile 2 of 4: a face of its own
    with BuildSketch(Plane.XY.offset(2).offset(EXTRUDE_START)):
        with Locations((13, -35)):
            Circle(SKETCH_15_R)
        with Locations((13, -35)):
            Circle(SKETCH_15_R_2, mode=Mode.SUBTRACT)
    # profile 3 of 4: a face of its own
    with BuildSketch(Plane.XY.offset(2).offset(EXTRUDE_START)):
        with Locations((13, -62.5)):
            Circle(SKETCH_15_R)
        with Locations((13, -62.5)):
            Circle(SKETCH_15_R_2, mode=Mode.SUBTRACT)
    # profile 4 of 4: a face of its own
    with BuildSketch(Plane.XY.offset(2).offset(EXTRUDE_START)):
        with Locations(Location((-13, -62.5, 0), (0, 0, 180))):
            Circle(SKETCH_15_R)
        with Locations((-13, -62.5)):
            Circle(SKETCH_15_R_2, mode=Mode.SUBTRACT)
    extrude(amount=-EXTRUDE_9_DEPTH)

    # 草圖16 → 除料-伸長9 (cut, up to next)
    with BuildSketch(Plane.XZ.offset(23), mode=Mode.PRIVATE) as cut_extrude_9_sk1:
        with Locations((-6.5, 15)):
            Rectangle(SKETCH_16_W, SKETCH_16_H)
    cut_extrude_9_tool1 = extrude(cut_extrude_9_sk1.sketch, amount=-CUT_EXTRUDE_9_REACH, mode=Mode.PRIVATE) & part.part
    # 草圖16 → 除料-伸長9 (cut, up to next)
    with BuildSketch(Plane.XZ.offset(23), mode=Mode.PRIVATE) as cut_extrude_9_sk2:
        with Locations((6.5, 15)):
            Rectangle(SKETCH_16_W, SKETCH_16_H)
    cut_extrude_9_tool2 = extrude(cut_extrude_9_sk2.sketch, amount=-CUT_EXTRUDE_9_REACH, mode=Mode.PRIVATE) & part.part
    add(cut_extrude_9_tool1.solids().sort_by_distance((-6.5, -23, 15))[0], mode=Mode.SUBTRACT)
    add(cut_extrude_9_tool2.solids().sort_by_distance((6.5, -23, 15))[0], mode=Mode.SUBTRACT)

    # 草圖17 → 填料-伸長10 (add)
    with BuildSketch(Plane.XY.offset(30)):
        Polygon((-15.232050808, -15.401923789), (-16.732050808, -18), (-16.212435565, -18.3), (-14.712435565, -15.701923789), align=None)
        Polygon((15.232050808, -15.401923789), (16.732050808, -18), (16.212435565, -18.3), (14.712435565, -15.701923789), align=None)
    extrude(amount=-EXTRUDE_10_DEPTH)

    # 草圖18 → 填料-伸長11 (add)
    with BuildSketch(Plane(origin=(0, 0, 0), x_dir=(-1, 0, 0), z_dir=(0, 0, -1))):
        Polygon((-16.732050808, -18), (-15, -27), (-15, -19), align=None)
        Polygon((16.732050808, -18), (15, -19), (15, -27), align=None)
    extrude(amount=-EXTRUDE_11_DEPTH)

    # 草圖19 → 除料-伸長10 (cut, up to next)
    with BuildSketch(Plane.XY.offset(2), mode=Mode.PRIVATE) as cut_extrude_10_sk1:
        with Locations((0, -6.613248654)):
            Rectangle(SKETCH_19_W, SKETCH_19_H)
    cut_extrude_10_tool1 = extrude(cut_extrude_10_sk1.sketch, amount=-CUT_EXTRUDE_10_REACH, mode=Mode.PRIVATE) & part.part
    add(cut_extrude_10_tool1.solids().sort_by_distance((0, -6.613249, 2))[0], mode=Mode.SUBTRACT)


solid = part.part
